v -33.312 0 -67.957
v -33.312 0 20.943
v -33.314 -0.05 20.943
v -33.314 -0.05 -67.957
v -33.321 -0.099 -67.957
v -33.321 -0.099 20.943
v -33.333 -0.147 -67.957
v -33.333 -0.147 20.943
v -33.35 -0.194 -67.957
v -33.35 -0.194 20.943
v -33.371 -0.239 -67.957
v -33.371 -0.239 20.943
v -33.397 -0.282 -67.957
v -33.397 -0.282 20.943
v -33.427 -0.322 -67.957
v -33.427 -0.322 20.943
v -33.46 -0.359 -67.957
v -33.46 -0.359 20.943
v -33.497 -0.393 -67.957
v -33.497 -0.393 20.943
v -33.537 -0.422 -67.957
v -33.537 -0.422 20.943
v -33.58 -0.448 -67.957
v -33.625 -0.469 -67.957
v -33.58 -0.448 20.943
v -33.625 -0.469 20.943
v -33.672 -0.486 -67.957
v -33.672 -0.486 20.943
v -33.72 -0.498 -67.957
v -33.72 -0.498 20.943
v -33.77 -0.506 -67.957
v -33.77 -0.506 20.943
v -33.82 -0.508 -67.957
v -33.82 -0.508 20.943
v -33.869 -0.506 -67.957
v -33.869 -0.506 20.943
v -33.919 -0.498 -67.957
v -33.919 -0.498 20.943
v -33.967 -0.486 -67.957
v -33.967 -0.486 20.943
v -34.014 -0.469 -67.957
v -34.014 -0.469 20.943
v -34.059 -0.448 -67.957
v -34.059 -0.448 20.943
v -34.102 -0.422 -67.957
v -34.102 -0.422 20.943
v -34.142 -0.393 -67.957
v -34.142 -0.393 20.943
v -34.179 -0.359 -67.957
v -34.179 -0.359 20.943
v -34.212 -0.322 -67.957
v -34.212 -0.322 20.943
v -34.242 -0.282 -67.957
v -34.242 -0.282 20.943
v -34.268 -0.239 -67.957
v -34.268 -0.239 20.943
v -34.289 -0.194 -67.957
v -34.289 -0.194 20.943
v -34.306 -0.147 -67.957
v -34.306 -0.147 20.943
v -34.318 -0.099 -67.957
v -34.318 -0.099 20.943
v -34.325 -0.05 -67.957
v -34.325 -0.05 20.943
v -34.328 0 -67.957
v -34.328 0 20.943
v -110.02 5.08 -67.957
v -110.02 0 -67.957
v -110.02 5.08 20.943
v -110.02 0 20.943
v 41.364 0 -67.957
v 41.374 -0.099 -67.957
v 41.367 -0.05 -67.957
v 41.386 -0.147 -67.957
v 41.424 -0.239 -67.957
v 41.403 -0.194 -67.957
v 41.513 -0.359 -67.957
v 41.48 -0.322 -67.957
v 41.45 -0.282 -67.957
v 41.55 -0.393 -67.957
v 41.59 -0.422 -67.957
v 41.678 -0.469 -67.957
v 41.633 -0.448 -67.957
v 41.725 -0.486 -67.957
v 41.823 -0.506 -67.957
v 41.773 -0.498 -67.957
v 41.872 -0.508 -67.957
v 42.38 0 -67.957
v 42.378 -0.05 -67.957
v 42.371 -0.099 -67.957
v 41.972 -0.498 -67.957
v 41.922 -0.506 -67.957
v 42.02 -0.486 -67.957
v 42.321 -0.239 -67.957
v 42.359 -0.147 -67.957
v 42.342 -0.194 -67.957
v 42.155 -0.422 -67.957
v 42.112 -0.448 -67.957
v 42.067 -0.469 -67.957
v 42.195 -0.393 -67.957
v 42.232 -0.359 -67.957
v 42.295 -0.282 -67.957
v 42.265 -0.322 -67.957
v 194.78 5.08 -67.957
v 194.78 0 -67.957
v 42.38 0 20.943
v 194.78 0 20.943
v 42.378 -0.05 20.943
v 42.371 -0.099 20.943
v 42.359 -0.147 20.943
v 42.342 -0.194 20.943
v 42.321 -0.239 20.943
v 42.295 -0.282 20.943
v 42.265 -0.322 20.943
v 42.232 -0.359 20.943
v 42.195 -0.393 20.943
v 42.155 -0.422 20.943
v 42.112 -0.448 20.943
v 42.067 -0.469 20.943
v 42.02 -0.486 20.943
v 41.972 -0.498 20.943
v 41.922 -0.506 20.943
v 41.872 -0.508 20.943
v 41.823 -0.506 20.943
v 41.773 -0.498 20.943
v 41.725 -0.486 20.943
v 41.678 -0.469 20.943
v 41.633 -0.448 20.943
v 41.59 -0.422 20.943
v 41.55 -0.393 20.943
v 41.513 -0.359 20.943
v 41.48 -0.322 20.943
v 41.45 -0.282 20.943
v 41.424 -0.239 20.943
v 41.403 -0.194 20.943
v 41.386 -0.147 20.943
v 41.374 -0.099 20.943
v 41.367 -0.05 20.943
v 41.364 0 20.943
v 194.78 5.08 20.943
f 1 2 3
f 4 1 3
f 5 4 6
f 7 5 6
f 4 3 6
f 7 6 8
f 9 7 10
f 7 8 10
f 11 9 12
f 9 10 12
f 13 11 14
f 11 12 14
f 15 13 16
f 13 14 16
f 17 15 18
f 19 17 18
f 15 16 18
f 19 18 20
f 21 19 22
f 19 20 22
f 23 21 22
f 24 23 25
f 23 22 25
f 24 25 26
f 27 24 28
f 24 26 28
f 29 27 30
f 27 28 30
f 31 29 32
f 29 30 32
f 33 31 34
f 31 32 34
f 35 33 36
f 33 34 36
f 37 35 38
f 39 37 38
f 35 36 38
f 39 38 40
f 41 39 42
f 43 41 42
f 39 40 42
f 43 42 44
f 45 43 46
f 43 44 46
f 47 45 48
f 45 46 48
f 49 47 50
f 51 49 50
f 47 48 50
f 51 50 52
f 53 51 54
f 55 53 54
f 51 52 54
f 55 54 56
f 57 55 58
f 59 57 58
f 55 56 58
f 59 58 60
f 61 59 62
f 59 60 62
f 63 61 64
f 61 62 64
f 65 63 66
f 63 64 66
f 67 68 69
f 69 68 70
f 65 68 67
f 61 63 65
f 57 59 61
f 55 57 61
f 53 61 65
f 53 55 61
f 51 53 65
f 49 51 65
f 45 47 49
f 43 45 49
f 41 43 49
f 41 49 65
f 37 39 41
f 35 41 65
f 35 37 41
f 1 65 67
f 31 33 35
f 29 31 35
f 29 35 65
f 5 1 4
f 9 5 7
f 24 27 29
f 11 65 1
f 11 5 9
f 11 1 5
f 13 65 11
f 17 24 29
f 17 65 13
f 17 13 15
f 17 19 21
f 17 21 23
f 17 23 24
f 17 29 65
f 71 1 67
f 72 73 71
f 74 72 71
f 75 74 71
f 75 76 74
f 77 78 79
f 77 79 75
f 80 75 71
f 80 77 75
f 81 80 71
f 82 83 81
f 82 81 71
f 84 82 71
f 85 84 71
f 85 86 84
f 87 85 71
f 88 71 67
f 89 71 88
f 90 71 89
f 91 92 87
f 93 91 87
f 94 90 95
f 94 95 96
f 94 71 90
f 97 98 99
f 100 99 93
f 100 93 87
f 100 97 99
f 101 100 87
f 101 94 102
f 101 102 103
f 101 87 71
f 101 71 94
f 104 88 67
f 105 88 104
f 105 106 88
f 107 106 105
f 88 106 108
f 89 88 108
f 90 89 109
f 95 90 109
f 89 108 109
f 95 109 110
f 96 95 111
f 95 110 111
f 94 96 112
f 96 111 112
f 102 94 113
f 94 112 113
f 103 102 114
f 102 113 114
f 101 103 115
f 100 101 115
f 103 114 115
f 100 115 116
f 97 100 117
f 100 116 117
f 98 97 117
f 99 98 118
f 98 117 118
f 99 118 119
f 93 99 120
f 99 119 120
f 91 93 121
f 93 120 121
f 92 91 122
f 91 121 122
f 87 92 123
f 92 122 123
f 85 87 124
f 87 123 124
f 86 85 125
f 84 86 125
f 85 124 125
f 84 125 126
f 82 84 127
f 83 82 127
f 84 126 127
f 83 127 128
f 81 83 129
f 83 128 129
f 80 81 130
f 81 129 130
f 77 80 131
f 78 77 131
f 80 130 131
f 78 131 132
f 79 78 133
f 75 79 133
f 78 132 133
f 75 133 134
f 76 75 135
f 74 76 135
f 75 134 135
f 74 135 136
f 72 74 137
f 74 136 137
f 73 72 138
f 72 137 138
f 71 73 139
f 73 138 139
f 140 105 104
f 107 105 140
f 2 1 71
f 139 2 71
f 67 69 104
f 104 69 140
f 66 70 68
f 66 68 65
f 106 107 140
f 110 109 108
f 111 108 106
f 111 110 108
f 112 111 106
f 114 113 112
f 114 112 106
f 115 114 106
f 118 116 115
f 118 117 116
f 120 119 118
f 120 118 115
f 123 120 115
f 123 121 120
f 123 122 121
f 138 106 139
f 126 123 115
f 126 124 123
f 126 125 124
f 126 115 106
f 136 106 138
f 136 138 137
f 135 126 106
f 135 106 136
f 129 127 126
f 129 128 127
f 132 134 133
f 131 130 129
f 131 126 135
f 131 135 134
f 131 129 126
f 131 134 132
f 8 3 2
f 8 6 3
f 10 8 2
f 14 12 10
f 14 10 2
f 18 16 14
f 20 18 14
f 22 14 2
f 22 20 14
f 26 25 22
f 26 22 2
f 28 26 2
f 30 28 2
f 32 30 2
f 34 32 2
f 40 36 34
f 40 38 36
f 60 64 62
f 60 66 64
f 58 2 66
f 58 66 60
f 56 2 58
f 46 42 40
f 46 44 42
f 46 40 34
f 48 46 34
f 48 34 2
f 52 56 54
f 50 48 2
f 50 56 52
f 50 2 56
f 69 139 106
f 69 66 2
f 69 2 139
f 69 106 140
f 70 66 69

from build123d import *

# Parameters (mm, degrees)
F0_W     = 76.2
F0_H     = 88.9
F0_W_2   = 0.508
F0_W_3   = 75.184
F0_W_4   = 152.4
F1_DEPTH = 5.08


with BuildPart() as f1:
    # F0 (on Front) → F1 (new body)
    with BuildSketch(Plane.XZ):
        with Locations((-71.919513, -23.507463)):
            Rectangle(F0_W, F0_H)
        with Locations((-33.565513, -23.507463)):
            Rectangle(F0_W_2, F0_H)
        with Locations((4.280487, -23.507463)):
            Rectangle(F0_W_3, F0_H)
        with Locations((42.126487, -23.507463)):
            Rectangle(F0_W_2, F0_H)
        with Locations((118.580487, -23.507463)):
            Rectangle(F0_W_4, F0_H)
    extrude(amount=-F1_DEPTH)

    # F0 (on Front) → F2 (revolve)
    with BuildSketch(Plane.XZ):
        with Locations((-33.565513, -23.507463)):
            Rectangle(F0_W_2, F0_H)
    revolve(axis=Axis((-33.819513, 0, -23.507463), (0, 0, -1)))

    # F0 (on Front) → F3 (revolve)
    with BuildSketch(Plane.XZ):
        with Locations((42.126487, -23.507463)):
            Rectangle(F0_W_2, F0_H)
    revolve(axis=Axis((41.872487, 0, -23.507463), (0, 0, -1)))


solid = f1.part
